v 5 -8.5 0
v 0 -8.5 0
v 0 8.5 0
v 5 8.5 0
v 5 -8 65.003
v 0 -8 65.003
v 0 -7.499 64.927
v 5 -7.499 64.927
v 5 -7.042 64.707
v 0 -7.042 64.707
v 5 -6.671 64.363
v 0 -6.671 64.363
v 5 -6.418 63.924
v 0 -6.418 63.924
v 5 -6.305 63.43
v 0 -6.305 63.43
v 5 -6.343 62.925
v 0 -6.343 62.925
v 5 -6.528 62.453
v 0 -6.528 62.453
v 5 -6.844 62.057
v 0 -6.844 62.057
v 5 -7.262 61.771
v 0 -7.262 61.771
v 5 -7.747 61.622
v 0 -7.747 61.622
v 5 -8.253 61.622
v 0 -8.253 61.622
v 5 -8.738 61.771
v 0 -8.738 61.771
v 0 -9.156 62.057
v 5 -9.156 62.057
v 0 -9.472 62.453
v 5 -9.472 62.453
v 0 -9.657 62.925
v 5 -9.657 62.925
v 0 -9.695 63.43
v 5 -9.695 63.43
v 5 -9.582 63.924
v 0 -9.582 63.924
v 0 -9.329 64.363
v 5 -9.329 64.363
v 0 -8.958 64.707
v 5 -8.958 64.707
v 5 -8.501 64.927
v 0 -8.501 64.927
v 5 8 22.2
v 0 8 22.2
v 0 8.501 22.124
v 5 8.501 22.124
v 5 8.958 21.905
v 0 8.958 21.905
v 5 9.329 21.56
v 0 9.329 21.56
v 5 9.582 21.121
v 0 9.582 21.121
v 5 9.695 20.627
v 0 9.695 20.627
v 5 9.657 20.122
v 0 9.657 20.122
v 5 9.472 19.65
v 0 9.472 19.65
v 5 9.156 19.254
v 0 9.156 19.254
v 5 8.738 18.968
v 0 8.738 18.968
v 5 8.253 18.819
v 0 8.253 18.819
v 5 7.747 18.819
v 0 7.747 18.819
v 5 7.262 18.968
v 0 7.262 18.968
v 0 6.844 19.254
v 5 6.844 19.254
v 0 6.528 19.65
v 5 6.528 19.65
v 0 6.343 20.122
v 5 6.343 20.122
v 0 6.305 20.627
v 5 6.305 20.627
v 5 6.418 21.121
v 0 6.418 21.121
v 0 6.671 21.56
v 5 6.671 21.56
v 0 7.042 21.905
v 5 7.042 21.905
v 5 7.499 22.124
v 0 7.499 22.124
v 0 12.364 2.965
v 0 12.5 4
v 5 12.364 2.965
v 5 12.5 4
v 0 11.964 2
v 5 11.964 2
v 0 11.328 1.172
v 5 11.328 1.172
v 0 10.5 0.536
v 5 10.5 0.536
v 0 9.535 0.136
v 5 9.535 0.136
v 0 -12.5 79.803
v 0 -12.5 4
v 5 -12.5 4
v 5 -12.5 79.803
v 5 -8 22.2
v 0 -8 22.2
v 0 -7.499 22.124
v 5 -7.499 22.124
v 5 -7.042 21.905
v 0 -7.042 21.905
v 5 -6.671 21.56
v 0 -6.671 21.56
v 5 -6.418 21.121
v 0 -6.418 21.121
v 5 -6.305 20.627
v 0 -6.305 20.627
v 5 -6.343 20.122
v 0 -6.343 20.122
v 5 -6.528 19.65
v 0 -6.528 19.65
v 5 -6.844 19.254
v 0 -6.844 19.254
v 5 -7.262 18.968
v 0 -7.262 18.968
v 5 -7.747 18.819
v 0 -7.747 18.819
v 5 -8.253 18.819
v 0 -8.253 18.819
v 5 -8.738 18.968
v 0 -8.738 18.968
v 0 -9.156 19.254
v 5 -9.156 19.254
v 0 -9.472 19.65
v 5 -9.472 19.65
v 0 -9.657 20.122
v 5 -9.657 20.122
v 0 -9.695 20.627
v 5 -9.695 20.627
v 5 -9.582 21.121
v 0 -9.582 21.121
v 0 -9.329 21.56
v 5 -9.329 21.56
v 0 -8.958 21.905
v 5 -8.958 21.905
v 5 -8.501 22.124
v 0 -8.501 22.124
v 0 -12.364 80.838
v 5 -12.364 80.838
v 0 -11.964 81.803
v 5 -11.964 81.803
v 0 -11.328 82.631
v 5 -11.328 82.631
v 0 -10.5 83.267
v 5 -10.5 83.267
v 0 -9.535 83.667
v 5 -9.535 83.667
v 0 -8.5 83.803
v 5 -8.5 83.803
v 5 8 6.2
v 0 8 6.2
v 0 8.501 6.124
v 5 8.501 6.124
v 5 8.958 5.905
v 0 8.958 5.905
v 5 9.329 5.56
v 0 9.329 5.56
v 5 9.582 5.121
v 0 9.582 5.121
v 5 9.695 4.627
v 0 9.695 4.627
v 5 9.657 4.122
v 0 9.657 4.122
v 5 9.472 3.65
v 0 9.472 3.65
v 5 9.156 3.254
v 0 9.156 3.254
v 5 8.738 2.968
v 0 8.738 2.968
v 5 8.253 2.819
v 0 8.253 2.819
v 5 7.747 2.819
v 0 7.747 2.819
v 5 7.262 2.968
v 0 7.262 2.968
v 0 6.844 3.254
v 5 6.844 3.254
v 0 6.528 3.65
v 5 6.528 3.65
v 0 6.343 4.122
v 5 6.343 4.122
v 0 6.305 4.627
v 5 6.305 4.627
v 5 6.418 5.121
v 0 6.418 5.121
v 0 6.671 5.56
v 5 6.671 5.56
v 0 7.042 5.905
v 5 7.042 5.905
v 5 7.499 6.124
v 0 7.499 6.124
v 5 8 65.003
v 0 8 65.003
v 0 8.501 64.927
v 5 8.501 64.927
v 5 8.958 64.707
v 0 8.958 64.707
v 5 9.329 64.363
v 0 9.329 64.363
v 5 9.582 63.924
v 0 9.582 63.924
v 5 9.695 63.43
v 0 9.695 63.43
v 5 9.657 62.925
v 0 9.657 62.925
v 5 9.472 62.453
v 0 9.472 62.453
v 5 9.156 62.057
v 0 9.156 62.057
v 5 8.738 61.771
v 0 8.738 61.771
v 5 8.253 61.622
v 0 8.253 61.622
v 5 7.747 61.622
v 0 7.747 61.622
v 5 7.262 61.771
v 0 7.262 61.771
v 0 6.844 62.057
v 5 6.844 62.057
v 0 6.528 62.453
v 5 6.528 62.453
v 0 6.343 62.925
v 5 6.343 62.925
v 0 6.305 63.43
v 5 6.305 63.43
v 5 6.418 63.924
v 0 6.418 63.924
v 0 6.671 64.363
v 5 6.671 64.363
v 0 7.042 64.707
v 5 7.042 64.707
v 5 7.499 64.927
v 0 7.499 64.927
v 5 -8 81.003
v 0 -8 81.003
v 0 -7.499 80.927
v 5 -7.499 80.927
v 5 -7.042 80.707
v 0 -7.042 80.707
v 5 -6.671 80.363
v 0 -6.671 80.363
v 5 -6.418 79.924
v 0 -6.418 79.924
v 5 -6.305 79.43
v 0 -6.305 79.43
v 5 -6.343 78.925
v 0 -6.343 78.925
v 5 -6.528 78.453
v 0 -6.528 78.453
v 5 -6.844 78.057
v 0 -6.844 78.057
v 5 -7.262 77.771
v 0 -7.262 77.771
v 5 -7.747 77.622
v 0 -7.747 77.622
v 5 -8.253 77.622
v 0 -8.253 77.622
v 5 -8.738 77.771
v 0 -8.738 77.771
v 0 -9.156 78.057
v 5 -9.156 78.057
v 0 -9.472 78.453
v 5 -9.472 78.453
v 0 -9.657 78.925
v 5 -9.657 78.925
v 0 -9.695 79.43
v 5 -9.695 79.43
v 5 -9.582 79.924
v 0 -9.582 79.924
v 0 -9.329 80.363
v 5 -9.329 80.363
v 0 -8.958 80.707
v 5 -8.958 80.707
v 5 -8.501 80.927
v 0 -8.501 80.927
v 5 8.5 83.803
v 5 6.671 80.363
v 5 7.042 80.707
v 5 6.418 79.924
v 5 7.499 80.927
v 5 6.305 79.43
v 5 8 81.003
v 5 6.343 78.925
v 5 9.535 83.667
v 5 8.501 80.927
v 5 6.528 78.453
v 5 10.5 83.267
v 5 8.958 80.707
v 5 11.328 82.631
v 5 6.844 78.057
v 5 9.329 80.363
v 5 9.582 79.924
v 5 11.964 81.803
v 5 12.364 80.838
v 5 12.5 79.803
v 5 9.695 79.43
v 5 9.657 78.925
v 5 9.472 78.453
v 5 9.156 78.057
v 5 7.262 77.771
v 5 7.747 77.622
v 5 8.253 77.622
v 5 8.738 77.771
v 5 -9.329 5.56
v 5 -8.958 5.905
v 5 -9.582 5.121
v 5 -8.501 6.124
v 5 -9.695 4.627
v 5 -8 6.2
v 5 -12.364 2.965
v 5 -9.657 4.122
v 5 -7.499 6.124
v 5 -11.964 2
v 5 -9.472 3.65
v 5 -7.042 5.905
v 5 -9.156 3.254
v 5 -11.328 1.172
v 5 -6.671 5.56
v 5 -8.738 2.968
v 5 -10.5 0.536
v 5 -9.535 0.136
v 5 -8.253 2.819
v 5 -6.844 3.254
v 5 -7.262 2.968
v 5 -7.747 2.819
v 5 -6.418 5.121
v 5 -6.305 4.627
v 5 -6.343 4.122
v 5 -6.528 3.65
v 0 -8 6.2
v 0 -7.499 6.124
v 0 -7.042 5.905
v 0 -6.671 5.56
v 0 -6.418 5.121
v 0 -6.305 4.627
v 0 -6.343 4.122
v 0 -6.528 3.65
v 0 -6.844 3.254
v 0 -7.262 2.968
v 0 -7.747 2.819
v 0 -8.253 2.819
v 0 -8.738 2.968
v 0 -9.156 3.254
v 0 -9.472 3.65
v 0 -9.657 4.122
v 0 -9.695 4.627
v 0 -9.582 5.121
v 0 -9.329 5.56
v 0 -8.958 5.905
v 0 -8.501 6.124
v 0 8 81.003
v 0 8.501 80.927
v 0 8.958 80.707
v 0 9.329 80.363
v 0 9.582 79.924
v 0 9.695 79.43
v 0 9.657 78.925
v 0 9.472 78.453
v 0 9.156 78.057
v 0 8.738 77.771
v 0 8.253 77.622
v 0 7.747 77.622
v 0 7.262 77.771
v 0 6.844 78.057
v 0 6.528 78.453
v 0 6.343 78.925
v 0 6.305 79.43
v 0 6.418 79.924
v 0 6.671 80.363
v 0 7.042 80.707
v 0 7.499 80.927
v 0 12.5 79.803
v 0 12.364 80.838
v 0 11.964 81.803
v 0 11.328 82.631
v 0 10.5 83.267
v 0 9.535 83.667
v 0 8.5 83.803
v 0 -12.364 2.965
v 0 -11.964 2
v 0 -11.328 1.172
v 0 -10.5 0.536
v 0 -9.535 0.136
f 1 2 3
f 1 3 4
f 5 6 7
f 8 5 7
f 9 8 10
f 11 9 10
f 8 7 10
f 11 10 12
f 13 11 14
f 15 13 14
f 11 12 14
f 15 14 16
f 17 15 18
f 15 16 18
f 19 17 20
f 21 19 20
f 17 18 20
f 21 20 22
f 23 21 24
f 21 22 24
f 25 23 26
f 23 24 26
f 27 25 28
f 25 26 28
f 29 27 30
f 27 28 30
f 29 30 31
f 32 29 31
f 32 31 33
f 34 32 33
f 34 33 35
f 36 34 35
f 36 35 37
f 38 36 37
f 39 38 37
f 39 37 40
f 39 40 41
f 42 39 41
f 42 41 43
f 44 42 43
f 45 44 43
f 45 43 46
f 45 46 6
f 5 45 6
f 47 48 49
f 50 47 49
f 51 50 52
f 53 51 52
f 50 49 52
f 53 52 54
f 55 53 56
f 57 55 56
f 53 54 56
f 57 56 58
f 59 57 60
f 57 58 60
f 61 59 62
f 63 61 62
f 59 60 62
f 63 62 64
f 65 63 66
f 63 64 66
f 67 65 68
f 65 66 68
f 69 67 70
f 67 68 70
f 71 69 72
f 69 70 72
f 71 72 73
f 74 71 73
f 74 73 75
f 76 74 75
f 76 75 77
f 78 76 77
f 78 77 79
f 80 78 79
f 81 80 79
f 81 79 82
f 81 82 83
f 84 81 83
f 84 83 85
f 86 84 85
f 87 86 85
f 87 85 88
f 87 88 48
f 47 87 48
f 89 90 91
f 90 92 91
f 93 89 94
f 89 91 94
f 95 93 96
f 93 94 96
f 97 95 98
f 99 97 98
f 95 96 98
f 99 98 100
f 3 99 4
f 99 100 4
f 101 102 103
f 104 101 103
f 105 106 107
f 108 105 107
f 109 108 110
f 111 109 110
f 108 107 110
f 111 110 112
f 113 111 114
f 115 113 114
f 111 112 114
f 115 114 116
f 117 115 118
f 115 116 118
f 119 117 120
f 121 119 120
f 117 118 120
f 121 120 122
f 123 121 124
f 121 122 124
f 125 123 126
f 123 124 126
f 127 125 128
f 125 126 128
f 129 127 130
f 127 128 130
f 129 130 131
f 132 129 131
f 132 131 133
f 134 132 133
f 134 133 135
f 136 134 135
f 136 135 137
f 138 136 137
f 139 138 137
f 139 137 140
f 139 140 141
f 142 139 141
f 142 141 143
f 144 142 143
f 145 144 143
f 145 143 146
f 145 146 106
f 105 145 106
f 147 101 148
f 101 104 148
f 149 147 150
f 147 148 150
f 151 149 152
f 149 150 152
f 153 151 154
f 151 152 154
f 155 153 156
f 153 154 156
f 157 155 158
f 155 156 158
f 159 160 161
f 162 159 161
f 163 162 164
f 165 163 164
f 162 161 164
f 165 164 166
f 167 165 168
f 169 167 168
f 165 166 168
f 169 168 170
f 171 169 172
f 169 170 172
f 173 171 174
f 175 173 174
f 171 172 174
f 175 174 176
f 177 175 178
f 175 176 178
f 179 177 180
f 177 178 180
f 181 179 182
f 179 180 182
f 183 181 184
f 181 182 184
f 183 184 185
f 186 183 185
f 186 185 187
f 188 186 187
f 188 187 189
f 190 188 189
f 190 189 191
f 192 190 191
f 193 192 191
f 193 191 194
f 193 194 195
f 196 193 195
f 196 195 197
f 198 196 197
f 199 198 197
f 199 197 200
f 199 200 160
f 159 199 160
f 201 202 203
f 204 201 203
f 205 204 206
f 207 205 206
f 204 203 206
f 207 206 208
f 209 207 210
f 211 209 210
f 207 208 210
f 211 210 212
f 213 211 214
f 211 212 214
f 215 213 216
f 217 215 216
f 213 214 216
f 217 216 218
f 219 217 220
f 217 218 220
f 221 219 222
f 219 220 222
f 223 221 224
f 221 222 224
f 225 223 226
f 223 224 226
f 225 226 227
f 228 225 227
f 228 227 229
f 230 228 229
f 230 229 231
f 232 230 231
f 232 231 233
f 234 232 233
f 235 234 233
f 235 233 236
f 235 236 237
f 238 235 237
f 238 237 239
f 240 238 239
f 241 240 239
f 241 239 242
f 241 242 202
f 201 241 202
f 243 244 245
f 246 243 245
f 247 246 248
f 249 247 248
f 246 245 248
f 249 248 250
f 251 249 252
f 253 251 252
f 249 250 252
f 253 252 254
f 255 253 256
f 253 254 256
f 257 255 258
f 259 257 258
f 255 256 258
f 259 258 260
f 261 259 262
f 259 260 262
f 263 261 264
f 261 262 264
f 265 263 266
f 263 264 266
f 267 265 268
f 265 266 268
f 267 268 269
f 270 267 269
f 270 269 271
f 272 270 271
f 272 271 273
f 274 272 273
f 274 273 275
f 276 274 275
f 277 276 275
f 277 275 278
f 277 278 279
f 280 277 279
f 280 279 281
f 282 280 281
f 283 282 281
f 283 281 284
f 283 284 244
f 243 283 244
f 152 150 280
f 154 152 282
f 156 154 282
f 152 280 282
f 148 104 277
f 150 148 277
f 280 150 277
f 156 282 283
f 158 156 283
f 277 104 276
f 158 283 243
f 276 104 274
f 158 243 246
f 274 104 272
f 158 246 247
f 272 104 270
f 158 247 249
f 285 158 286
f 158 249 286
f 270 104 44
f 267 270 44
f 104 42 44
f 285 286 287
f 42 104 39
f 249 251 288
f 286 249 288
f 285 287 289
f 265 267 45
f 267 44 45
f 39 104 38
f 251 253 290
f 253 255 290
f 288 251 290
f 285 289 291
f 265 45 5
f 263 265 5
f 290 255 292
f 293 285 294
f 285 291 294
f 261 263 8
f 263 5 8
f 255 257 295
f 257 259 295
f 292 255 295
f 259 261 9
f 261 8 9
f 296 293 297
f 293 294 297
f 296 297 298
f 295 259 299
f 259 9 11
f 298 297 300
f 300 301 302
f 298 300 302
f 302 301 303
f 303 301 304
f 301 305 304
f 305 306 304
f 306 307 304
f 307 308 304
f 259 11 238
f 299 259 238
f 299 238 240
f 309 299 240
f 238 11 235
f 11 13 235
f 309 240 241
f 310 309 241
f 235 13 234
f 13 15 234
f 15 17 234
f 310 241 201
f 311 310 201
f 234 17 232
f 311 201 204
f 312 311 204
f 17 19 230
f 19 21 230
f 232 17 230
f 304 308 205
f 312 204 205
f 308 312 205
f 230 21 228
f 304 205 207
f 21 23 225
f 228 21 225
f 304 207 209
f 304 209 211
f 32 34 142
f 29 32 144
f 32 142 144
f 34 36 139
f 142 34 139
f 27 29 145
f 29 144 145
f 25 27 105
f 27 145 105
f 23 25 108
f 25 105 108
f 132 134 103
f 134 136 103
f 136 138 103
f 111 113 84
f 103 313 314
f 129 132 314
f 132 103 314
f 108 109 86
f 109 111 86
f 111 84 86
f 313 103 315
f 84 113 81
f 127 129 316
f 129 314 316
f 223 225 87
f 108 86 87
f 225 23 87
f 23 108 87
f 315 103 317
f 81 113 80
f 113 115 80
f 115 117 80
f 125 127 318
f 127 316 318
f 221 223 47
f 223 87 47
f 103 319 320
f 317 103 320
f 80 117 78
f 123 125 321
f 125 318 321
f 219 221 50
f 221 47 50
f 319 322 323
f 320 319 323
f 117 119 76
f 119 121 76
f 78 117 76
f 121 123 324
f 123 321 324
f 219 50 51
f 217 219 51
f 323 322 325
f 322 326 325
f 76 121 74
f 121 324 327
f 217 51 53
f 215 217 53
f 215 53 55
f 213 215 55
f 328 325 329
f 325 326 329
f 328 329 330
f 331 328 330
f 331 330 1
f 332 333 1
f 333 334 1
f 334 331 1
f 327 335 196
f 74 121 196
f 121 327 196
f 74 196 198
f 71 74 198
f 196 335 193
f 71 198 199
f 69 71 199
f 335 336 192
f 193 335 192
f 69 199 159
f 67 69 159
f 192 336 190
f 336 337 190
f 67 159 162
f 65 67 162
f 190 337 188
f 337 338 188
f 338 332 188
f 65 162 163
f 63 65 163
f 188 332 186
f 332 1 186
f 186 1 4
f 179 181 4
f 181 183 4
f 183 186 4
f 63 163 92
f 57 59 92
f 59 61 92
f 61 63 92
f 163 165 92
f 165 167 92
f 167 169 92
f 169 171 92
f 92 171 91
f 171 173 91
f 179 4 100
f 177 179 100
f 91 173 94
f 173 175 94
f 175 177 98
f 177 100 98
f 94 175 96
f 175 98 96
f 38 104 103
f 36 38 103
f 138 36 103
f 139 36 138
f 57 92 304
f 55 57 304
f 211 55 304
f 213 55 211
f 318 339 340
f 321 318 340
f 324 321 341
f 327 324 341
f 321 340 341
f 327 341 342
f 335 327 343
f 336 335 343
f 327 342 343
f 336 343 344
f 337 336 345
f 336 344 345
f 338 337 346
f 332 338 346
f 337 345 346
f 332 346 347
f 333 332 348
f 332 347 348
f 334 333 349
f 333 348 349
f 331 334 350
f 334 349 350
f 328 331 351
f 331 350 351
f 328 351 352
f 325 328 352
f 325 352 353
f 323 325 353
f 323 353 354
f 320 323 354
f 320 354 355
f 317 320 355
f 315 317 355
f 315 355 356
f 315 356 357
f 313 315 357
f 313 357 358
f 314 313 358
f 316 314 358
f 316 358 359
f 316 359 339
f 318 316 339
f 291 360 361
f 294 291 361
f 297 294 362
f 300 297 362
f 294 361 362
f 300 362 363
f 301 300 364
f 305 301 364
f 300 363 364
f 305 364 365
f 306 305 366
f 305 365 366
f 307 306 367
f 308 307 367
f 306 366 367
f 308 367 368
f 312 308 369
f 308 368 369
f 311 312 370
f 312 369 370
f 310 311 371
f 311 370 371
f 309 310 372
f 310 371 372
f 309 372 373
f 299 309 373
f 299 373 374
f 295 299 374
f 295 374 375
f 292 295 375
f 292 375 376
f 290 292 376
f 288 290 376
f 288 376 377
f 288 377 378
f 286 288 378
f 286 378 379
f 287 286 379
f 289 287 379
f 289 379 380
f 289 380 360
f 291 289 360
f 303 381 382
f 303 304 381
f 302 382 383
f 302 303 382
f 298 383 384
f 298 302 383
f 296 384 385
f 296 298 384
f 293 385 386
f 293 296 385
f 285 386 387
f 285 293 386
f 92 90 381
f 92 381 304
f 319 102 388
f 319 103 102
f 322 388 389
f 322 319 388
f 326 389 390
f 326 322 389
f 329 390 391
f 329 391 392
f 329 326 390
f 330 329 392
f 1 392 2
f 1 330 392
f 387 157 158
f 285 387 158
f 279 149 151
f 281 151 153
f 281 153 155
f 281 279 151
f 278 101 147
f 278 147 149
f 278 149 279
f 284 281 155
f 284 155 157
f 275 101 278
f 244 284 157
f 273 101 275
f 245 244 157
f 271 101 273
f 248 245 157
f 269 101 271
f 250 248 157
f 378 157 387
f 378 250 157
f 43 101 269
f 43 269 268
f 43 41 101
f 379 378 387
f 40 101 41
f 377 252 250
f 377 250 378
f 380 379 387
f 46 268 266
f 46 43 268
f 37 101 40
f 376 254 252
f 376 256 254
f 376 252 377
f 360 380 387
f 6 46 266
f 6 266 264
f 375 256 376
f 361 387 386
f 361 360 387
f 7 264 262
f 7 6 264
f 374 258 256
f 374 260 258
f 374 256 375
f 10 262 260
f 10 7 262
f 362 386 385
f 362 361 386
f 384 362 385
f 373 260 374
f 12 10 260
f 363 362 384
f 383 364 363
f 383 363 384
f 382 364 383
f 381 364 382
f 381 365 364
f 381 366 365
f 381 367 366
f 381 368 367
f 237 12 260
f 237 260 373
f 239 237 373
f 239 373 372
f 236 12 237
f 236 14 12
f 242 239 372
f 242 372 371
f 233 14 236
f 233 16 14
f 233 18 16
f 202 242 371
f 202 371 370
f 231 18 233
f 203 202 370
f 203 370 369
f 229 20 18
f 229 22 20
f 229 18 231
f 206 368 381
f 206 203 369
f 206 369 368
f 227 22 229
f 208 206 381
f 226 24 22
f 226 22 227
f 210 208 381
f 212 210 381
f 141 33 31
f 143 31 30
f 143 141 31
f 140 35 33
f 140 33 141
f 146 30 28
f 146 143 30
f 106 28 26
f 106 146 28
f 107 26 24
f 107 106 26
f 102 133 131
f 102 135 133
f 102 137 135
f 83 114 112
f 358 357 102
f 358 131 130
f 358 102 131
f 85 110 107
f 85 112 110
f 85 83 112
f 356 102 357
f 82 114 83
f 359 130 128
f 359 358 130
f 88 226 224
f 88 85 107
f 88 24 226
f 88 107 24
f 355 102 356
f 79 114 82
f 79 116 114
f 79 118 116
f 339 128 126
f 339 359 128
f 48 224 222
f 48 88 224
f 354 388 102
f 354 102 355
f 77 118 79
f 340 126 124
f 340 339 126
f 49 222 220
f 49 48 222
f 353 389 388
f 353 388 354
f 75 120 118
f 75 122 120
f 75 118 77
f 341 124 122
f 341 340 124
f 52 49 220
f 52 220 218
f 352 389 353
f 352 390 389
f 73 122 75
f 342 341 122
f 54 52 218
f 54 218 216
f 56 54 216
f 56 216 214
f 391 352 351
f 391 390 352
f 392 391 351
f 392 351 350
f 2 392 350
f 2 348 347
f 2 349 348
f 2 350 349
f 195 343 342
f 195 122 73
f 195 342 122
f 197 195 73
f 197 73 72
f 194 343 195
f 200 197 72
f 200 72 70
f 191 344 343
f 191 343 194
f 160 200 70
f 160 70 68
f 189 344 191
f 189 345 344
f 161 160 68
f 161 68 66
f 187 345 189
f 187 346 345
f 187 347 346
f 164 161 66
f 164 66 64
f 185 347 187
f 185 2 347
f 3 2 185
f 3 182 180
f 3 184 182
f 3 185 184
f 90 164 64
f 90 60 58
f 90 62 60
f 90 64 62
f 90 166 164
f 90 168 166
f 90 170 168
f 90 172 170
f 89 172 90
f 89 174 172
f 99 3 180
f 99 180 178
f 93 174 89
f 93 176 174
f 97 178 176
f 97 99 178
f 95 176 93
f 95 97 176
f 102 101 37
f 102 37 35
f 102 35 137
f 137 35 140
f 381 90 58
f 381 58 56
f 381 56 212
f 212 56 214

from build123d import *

# Parameters (mm, degrees)
ESQUISSE1_W        = 5
ESQUISSE1_H        = 25
BOSS_EXTRU_1_DEPTH = 83.80285333
CONG_1_R           = 4
D_GAGEMENT_M31_D   = 3.4


with BuildPart() as part:
    # Esquisse1 → Boss.-Extru.1 (new body)
    with BuildSketch(Plane.XY):
        with Locations((2.5, 0)):
            Rectangle(ESQUISSE1_W, ESQUISSE1_H)
    extrude(amount=BOSS_EXTRU_1_DEPTH)

    # Congé1
    cong_1_edges = [part.edges().sort_by_distance(p)[0] for p in [
        (2.5, -12.5, 83.80285333),
        (2.5, 12.5, 83.80285333),
        (2.5, -12.5, 0),
        (2.5, 12.5, 0),
    ]]
    fillet(cong_1_edges, radius=CONG_1_R)

    # Dégagement M31 (through all)
    with Locations(Plane(origin=(5, 0, 0), x_dir=(0, 0, -1), z_dir=(1, 0, 0))):
        with Locations((-4.5, -8), (-4.5, 8), (-20.5, 8), (-63.30285333, 8), (-79.30285333, 8), (-79.30285333, -8), (-63.30285333, -8), (-20.5, -8)):
            Hole(D_GAGEMENT_M31_D / 2)


solid = part.part
